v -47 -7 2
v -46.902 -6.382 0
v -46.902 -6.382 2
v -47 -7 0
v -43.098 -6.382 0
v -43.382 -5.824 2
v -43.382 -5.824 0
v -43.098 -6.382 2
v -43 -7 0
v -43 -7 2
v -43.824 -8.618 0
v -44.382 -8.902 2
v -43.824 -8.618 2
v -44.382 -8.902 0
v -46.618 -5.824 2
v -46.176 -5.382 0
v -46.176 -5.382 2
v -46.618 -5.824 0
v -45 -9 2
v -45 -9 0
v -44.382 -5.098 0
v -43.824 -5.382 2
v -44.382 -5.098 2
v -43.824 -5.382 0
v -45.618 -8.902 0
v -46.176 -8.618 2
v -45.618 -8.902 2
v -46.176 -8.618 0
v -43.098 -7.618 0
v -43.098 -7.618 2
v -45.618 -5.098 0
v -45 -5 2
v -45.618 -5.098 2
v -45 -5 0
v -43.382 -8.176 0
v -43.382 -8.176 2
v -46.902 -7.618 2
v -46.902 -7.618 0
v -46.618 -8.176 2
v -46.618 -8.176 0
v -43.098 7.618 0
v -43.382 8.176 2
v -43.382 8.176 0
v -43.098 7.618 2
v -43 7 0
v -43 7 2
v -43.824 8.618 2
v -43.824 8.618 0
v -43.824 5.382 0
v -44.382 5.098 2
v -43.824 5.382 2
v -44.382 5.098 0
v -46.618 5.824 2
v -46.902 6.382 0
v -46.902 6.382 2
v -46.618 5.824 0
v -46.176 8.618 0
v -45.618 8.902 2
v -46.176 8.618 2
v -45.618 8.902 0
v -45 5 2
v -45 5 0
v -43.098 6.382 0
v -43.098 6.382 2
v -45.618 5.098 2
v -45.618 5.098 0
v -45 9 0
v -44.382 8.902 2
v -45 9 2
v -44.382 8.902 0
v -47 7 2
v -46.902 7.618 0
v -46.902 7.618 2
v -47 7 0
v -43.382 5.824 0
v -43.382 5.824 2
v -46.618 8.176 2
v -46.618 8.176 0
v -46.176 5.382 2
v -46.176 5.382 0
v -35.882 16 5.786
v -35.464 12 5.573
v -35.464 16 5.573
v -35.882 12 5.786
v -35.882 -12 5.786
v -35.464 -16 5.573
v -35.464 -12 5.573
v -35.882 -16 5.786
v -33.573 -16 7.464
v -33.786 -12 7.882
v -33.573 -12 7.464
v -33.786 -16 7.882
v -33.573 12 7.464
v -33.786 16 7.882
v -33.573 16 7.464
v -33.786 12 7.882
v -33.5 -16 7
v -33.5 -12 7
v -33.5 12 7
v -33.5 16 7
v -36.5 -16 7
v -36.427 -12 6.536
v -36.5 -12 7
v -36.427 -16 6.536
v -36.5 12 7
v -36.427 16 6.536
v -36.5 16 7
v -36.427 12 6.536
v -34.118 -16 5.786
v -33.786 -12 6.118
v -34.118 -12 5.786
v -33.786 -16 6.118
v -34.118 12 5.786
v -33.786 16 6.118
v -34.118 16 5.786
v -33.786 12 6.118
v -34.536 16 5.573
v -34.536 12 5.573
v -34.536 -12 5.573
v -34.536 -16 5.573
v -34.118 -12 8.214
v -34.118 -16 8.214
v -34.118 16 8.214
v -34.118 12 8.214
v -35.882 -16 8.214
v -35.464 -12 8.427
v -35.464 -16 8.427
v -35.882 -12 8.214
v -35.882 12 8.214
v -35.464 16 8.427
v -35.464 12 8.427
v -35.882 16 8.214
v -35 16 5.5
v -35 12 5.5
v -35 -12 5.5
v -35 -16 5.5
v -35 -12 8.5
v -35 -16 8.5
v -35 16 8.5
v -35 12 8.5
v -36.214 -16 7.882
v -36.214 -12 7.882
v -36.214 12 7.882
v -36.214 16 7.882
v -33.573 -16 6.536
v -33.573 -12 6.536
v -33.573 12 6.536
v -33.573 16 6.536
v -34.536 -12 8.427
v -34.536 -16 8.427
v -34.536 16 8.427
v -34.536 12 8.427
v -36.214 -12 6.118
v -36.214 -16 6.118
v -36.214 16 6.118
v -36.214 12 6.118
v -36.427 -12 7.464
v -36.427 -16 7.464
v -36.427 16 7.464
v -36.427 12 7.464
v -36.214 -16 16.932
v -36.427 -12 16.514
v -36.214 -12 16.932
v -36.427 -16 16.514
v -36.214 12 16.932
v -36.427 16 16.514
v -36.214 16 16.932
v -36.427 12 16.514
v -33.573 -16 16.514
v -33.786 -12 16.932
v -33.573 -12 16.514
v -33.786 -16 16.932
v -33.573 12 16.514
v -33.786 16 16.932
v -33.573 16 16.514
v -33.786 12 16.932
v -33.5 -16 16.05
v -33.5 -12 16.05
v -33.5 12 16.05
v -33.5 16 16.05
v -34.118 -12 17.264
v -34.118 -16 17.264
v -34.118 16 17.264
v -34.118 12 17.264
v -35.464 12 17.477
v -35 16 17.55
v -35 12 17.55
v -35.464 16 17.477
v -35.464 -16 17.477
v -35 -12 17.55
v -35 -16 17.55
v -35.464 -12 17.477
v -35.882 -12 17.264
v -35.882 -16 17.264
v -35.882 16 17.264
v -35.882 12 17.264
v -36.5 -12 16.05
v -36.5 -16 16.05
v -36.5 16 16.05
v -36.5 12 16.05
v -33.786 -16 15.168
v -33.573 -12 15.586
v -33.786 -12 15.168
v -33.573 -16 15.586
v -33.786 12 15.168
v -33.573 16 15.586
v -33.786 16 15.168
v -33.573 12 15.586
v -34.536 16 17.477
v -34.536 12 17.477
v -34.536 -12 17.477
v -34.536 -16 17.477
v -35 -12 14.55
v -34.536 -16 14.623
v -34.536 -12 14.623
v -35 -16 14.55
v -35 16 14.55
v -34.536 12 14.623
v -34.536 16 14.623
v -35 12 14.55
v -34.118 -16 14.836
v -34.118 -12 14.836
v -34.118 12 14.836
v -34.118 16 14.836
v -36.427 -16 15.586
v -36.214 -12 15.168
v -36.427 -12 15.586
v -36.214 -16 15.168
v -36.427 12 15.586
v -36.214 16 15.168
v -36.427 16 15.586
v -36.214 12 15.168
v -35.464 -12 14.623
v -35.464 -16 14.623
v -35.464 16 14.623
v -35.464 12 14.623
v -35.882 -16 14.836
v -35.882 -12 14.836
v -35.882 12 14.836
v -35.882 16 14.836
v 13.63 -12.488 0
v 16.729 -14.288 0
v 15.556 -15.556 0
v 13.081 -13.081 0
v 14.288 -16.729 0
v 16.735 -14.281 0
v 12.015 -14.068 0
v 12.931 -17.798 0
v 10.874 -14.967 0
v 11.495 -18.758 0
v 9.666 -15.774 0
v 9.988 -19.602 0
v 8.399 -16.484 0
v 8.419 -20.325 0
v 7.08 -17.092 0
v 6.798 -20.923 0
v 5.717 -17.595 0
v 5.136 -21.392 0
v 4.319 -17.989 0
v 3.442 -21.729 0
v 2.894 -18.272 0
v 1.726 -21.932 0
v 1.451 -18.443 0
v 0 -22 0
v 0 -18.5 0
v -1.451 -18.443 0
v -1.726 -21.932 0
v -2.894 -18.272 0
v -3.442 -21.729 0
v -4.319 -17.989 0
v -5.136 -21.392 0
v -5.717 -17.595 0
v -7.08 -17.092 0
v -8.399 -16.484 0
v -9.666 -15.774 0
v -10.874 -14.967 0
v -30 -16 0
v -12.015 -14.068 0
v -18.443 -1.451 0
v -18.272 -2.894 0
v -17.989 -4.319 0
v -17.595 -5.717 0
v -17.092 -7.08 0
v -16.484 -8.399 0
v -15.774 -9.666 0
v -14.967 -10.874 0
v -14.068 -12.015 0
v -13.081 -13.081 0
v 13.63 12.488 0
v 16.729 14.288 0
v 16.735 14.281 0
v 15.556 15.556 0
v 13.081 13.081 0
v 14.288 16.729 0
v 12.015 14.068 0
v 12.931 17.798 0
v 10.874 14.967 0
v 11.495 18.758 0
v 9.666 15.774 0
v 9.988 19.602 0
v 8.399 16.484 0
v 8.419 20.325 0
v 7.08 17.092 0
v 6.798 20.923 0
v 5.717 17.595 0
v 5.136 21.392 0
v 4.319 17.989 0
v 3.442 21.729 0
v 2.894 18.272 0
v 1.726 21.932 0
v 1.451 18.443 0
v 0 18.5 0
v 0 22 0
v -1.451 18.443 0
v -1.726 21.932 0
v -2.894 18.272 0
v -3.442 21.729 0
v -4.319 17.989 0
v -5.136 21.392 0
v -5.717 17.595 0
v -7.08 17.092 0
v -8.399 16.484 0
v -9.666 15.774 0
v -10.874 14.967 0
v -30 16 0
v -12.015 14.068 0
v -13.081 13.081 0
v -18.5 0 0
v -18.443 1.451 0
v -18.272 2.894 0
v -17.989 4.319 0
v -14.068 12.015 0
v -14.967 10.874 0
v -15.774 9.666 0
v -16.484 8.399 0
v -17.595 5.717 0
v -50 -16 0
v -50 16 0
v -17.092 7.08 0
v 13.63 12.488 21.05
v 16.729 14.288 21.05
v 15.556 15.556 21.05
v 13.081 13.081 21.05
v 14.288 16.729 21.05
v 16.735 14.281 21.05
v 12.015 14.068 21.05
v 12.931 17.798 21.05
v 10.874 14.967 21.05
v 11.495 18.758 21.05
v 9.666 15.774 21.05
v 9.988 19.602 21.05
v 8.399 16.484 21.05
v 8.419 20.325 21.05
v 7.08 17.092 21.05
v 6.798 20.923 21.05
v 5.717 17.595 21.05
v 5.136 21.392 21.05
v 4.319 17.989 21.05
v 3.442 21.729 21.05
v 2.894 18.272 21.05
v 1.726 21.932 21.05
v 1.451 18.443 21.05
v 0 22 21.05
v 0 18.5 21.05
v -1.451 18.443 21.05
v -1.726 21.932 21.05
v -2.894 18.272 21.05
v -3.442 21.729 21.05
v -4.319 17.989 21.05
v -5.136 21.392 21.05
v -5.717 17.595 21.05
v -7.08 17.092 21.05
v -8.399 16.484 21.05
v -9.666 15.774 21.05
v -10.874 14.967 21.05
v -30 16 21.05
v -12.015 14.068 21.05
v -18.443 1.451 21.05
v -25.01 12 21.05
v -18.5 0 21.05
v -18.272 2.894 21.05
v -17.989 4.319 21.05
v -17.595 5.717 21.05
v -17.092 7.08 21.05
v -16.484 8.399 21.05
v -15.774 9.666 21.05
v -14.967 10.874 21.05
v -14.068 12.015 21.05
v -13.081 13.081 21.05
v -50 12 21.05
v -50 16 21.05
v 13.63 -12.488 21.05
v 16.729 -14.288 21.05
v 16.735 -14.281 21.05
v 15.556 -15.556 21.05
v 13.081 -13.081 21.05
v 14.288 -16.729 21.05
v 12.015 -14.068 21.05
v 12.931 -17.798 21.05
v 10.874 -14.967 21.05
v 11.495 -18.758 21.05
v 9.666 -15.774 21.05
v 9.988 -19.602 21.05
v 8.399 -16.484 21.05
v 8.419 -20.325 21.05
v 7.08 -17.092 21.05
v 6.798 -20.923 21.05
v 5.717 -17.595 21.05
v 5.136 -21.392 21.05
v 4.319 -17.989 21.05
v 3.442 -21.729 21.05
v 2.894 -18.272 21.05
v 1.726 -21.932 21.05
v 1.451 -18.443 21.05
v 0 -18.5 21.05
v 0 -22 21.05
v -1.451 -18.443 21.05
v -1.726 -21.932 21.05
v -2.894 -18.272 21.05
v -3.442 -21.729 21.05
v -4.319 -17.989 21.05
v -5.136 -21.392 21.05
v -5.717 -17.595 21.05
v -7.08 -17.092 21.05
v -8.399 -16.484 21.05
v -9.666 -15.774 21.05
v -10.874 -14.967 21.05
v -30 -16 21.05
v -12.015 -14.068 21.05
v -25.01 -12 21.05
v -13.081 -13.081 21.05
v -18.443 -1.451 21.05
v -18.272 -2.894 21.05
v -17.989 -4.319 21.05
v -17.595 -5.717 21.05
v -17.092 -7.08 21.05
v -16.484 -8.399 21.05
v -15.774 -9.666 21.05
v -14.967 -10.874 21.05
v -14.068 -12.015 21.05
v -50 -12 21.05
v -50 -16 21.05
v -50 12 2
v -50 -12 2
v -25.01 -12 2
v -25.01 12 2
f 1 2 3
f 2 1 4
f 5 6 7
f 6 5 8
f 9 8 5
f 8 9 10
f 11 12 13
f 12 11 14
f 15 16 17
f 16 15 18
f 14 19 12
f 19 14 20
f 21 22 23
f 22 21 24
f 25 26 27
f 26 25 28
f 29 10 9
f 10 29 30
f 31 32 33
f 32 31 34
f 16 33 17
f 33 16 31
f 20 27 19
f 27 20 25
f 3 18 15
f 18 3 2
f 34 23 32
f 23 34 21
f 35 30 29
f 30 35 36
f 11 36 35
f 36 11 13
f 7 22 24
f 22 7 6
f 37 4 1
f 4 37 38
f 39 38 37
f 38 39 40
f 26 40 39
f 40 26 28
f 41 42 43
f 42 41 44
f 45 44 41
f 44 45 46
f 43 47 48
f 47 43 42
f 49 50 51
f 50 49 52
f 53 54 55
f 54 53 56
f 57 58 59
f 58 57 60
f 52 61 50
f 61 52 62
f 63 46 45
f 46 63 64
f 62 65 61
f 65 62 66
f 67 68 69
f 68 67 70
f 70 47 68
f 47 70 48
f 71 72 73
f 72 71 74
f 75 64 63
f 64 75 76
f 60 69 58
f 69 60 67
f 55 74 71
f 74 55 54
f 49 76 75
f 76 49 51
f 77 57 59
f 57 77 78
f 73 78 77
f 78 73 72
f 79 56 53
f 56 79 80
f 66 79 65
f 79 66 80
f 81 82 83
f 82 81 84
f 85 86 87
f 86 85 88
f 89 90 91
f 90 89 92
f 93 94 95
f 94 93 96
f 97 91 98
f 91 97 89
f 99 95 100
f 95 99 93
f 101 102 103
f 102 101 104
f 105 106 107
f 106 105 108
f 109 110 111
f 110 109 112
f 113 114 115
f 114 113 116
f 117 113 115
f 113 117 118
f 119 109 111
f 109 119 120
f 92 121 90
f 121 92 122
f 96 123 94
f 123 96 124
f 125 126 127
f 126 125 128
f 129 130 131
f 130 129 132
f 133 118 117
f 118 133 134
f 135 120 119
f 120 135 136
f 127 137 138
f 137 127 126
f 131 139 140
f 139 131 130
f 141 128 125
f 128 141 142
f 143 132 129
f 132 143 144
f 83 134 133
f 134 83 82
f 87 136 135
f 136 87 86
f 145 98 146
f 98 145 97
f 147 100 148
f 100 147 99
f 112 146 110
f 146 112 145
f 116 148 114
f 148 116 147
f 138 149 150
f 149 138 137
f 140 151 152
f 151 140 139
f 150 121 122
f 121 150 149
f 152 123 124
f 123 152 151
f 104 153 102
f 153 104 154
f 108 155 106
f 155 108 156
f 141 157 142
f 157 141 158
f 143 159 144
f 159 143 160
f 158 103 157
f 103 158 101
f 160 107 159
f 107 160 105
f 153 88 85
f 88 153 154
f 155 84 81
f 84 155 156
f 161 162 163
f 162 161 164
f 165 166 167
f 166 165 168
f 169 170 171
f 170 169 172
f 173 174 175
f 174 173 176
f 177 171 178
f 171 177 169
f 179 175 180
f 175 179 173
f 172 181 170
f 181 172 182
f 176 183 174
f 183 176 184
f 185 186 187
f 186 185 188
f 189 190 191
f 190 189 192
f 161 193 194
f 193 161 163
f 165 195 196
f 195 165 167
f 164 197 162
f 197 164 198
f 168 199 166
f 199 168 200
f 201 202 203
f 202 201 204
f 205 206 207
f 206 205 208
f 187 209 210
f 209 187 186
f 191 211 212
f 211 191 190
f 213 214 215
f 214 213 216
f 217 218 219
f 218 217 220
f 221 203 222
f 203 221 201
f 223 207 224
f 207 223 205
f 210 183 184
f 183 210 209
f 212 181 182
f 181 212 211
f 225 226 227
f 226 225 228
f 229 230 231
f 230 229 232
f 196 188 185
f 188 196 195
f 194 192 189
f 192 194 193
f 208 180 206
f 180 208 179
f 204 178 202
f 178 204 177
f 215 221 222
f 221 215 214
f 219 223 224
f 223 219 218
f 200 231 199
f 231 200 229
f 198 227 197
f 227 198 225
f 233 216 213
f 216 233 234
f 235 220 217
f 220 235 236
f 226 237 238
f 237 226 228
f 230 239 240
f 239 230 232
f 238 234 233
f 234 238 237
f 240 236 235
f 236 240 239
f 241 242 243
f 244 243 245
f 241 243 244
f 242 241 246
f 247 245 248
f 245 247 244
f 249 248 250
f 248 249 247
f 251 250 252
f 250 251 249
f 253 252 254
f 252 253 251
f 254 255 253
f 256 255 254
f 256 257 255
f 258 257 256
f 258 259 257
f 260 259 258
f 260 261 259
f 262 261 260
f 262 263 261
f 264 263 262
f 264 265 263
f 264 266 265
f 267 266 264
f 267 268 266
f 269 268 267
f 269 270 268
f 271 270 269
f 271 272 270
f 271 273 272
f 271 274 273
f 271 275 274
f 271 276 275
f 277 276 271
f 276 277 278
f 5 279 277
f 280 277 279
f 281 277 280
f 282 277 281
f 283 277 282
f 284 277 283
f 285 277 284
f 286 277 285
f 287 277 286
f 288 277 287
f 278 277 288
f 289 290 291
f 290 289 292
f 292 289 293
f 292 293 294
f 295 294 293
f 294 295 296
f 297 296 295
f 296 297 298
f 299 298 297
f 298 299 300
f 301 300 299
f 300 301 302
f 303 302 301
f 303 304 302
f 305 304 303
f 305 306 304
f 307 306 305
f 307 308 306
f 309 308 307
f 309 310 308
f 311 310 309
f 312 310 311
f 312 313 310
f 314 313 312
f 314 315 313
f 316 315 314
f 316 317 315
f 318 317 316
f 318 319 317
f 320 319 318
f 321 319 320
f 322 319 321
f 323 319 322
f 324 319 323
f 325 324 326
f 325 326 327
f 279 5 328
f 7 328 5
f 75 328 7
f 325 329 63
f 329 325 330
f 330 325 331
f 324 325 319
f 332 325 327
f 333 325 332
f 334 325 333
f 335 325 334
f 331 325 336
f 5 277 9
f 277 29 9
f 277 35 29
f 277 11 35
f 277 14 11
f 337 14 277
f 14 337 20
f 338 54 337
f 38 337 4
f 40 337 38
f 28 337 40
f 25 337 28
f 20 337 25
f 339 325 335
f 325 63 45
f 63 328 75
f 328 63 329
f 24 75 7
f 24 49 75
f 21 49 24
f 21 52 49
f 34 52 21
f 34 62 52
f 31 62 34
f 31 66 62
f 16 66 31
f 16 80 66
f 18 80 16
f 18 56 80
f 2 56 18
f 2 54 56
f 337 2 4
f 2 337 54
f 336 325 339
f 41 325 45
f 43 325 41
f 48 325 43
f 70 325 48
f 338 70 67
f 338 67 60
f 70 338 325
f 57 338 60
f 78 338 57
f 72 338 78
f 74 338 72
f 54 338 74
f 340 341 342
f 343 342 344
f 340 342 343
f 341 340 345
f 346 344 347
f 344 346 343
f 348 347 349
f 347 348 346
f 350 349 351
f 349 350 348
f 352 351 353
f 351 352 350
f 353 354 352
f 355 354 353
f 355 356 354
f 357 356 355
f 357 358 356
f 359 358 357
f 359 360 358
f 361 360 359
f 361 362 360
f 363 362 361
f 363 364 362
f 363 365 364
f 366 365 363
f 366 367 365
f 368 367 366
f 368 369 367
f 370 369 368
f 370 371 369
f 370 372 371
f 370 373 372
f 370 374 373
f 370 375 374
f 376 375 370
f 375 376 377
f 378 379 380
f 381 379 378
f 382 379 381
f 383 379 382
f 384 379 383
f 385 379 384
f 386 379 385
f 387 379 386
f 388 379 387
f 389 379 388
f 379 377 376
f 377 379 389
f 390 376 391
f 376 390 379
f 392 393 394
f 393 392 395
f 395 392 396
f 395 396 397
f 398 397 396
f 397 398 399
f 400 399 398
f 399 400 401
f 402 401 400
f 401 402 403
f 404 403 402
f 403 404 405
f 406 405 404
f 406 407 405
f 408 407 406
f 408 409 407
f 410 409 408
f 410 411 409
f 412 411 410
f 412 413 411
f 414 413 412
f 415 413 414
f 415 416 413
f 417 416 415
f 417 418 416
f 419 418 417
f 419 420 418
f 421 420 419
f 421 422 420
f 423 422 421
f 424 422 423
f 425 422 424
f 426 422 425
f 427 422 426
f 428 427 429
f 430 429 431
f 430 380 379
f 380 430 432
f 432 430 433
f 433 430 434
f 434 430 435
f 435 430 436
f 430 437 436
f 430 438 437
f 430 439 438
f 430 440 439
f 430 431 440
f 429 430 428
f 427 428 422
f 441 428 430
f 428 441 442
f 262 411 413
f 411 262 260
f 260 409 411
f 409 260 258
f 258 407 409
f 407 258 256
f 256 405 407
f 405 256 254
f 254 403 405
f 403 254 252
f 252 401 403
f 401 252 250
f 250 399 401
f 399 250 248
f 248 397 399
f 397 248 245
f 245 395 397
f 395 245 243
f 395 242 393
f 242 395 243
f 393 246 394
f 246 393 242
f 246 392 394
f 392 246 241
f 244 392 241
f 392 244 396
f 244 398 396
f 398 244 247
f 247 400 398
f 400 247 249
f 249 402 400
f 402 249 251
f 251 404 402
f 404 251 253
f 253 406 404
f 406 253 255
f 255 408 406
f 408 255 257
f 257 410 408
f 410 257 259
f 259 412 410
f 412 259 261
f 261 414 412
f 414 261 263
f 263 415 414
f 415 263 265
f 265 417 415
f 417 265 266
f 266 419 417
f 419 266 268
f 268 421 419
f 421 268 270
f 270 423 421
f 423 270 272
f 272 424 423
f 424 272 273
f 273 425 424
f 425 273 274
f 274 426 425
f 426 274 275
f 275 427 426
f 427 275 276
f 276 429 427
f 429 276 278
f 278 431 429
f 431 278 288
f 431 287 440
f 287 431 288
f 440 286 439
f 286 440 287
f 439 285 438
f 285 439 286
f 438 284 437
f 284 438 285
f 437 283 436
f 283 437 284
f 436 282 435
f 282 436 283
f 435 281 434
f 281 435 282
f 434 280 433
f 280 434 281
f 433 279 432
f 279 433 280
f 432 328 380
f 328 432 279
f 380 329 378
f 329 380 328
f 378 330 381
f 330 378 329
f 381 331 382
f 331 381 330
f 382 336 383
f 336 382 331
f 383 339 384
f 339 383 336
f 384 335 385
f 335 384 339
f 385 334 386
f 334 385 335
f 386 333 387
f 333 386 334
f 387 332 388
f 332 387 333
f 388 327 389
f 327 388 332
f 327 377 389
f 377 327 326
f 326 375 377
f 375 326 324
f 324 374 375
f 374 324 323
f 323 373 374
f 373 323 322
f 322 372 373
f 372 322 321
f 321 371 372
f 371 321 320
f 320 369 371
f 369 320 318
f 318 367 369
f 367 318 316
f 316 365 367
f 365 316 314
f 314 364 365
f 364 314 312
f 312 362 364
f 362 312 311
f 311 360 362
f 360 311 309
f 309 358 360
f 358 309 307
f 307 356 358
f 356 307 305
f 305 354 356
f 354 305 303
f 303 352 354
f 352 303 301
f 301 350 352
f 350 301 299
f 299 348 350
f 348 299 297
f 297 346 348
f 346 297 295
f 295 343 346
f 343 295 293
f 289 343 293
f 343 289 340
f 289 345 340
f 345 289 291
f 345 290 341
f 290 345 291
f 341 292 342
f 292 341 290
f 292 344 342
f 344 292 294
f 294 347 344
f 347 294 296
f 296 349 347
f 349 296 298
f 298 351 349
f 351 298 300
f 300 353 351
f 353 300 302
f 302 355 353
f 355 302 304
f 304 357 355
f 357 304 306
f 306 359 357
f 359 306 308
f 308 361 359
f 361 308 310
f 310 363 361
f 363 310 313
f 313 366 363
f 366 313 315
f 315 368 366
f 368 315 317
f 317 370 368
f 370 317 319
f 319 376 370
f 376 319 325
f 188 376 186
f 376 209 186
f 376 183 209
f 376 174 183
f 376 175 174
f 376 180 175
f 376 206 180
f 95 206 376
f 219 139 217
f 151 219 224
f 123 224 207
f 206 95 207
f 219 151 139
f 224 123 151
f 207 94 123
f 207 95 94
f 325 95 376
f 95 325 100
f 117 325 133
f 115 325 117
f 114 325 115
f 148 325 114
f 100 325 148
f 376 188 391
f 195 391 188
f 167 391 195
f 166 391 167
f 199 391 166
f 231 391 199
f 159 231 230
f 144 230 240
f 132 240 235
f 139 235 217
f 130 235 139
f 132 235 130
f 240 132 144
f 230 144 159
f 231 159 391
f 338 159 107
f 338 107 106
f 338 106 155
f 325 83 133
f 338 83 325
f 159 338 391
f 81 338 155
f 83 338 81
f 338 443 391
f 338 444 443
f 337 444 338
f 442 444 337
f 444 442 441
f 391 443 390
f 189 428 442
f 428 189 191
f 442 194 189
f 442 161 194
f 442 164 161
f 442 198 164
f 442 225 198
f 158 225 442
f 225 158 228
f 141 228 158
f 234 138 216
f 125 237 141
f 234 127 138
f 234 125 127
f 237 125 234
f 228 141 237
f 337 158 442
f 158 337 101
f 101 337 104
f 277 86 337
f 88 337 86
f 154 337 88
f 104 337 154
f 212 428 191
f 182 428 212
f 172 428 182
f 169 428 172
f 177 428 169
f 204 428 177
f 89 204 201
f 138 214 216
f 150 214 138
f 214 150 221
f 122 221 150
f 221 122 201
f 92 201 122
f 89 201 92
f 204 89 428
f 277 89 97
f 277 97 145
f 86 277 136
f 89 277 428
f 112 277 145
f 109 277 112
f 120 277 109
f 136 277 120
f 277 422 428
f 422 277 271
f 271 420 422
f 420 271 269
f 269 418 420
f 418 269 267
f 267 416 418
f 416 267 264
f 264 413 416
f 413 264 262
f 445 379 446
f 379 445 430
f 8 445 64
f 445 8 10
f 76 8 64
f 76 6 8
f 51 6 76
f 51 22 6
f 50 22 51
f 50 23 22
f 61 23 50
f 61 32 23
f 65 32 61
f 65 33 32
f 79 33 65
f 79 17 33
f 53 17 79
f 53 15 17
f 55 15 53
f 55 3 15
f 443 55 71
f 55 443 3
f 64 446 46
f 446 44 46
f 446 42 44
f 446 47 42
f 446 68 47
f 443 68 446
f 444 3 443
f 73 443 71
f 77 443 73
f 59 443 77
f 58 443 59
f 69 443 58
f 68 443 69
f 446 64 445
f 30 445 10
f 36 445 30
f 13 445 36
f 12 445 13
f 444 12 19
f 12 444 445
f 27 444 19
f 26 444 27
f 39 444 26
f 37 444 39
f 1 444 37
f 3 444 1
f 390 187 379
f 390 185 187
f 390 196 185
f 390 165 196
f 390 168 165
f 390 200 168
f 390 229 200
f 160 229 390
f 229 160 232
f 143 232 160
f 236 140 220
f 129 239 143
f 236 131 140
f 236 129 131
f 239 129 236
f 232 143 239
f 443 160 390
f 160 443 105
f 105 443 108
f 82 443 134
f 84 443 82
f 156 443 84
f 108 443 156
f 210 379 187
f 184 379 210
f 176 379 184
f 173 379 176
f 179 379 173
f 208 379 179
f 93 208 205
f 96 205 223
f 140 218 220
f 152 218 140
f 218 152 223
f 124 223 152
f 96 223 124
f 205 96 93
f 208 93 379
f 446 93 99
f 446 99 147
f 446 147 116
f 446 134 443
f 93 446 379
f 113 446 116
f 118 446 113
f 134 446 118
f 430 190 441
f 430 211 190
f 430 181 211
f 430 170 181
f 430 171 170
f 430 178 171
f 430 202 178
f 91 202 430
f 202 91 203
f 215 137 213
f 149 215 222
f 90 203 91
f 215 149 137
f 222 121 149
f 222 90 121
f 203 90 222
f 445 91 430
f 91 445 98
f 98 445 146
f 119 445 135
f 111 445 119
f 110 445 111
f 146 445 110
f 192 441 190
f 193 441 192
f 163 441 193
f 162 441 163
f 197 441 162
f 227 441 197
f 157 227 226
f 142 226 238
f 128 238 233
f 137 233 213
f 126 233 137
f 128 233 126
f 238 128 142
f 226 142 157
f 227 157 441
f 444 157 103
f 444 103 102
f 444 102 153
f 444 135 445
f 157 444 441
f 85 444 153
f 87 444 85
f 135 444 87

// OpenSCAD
!hand();
wallmount();
translate([0,0,47]) difference() {
  union() {
    translate([0,0,-47]) attach_base();
    cylinder(d1=34,d2=12,h=40,$fn=60);
    linear_extrude(80,convexity=3) hull() {
      translate([0,-10]) circle(d=12,$fn=40);
      translate([0,10]) circle(d=12,$fn=40);
    }
  }
  translate([-10,-20,60]) rotate([32,0]) cube([20,40,20]);
  translate([0,0,-.01]) {
    cylinder(d1=28.5,d2=10,h=40.02,$fn=60);
    linear_extrude(80.02,convexity=3) hull() {
      for(y=[-10,10]) translate([0,y]) circle(d=9,$fn=40);
    }
  }
}
module attach_base() {
  difference(){
    union() {
      translate([0,0,1]) cylinder(d=34,h=46,$fn=60);
      cylinder(d1=32,d2=34,h=1,$fn=60);
      translate([0,0,38]) intersection() {
        union() {
          translate([12,-11,-1]) rotate([0,-30,0]) cube([20,8,10]);
          translate([12,3,-1]) rotate([0,-30,0]) cube([20,8,10]);
          translate([12,-3,-3]) rotate([0,-30,0]) cube([20,6,10]);
        }
        scale([1,.9,1])
        cylinder(d=39,h=10,$fn=80);
        rotate([0,90]) {
          translate([-1,-1]) linear_extrude(20,convexity=3) hull() {
            circle(d=2,$fn=12);
            translate([-4.5,0]) circle(d=2,$fn=12);
          }
          translate([3,0]) scale([.8,1,1])
            translate([0,0,10]) difference() {
              scale([1,.71,1])
              cylinder(d1=36,d2=24,h=10,$fn=60);
              translate([0,0,-.01]) cylinder(d1=15,d2=22,h=10.02,$fn=60);
            }
        }
      }
    }
    translate([0,0,-.01]) cylinder(d=28.5,h=47.02,$fn=60);
    translate([0,0,9.5]) {
      difference() {
        union() {
          cylinder(d=34.02,h=7.1,$fn=60);
        }
        translate([0,0,-.01]) cylinder(d=30.5,h=4.1,$fn=60);
        translate([0,0,4.08]) cylinder(d1=30.5,d2=34.02,h=3.04,$fn=60);
      }
    }
  }
  
}
module hand_attachment() {
difference() {
  hand();
  translate([-50,-12,10])
    cube([25,24,10.02]);
  for(x=[-40,-30])
  translate([x,0,-.01]) cylinder(d=4,h=10.02,$fn=30);
}
}
module wallmount() {
rotate([0,0,-90])
intersection() {
  *translate([-130,-30]) cube([180,60,2]);
difference() {
  union() {
    %hand(25);
    translate([-120,-5]) {
      cube([110,10,10]);
      intersection() {
        translate([0,-4,0]) cube([10,18,112]);
        minkowski(){
          translate([-2,-2]) cube([10,14,110]);
          sphere(r=2,$fn=20);
        }
      }
      intersection() {
        translate([90,0]) rotate([0,-45]) cube([10,10,130]);
        cube([110,10,100]);
      }
    }
    translate([-40,-10]) cube([10,20,25]);
  }
  for(z=[5,20])
  {
    translate([0,0,z]) rotate([0,-90,0]) cylinder(d=3,h=40,$fn=20);
    translate([-36,-3.1,z<10?z-5.01:z-3.99]) cube([3,6.2,9]);
  }
  translate([-30,-10.01,-.01]) cube([20,20.02,30]);
  translate([0,0,-.01])
    cylinder(d=37,h=20.02,$fn=80);
  for(m=[0,1]) mirror([0,m])
  translate([20,0,-.01]) rotate([0,0,60]) translate([-14,-15]) cube([20,20,20.02]);
  for(z=[101])
  translate([-109.99,0,z]) rotate([0,-90,0]) {
    cylinder(d=4,h=10.02,$fn=20);
    cylinder(d1=9,d2=4,h=3,$fn=20);
  }
  translate([-109.99,0,18]) rotate([0,-90,0]) {
    linear_extrude(10.02,convexity=3) hull() {
      circle(d=4,h=10.02,$fn=20);
      translate([10,0]) circle(d=4,$fn=20);
    }
    translate([10,0]) cylinder(d=9,h=10.02,$fn=20);
  }
}
}
}
module hand(t=25.4*3/4+2) {
  difference() {
    linear_extrude(t,convexity=3) difference() {
      union() {
        hull()
        {
          translate([-30,-16]) square([10,32]);
          circle(d=44,h=10,$fn=80);
        }
        translate([-50,-16]) square([20,32]);
      }
      circle(d=37,$fn=80);
      for(m=[0,1]) mirror([0,m])
    translate([20,0,-.01]) rotate([0,0,60]) translate([-14,-15]) square([20,20]);
    }
    for(y=[-7,7])
    translate([-45,y,-.01]) cylinder(d=4,h=2.02,$fn=20);
    translate([-50.01,-12,2]) cube([25,24,30]);
    for(z=[7,t-5])
      translate([-35,20,z]) rotate([90]) {
        cylinder(d=3,h=40,$fn=20);
        *cylinder(d=8,h=23,$fn=40);
      }
  }
}
module rounded_rect(w,h,r) {
  translate([r,r]) circle(d=r*2,$fn=30);
  translate([r,h-r]) circle(d=r*2,$fn=30);
  translate([w-r,h-r]) circle(d=r*2,$fn=30);
  translate([w-r,r]) circle(d=r*2,$fn=30);
  translate([r,0]) square([w-r*2,h]);
  translate([0,r]) square([r,h-r*2]);
  translate([w-r,r]) square([r,h-r*2]);
}
module rounded_cube(dims,rsides=2,rvert=0)
{
  w=dims[0];
  h=dims[1];
  d=dims[2];
  if(rvert==0)
  {
    linear_extrude(d) rounded_rect(w,h,rsides);
  } else {
    translate([rsides,rsides,rvert]) scale([1,1,rvert/rsides]) minkowski() {
      cube([w-rsides*2,h-rsides*2,(d-rvert*2)/(rvert/rsides)]);
      sphere(rsides,$fn=30);
    }
  }
}
